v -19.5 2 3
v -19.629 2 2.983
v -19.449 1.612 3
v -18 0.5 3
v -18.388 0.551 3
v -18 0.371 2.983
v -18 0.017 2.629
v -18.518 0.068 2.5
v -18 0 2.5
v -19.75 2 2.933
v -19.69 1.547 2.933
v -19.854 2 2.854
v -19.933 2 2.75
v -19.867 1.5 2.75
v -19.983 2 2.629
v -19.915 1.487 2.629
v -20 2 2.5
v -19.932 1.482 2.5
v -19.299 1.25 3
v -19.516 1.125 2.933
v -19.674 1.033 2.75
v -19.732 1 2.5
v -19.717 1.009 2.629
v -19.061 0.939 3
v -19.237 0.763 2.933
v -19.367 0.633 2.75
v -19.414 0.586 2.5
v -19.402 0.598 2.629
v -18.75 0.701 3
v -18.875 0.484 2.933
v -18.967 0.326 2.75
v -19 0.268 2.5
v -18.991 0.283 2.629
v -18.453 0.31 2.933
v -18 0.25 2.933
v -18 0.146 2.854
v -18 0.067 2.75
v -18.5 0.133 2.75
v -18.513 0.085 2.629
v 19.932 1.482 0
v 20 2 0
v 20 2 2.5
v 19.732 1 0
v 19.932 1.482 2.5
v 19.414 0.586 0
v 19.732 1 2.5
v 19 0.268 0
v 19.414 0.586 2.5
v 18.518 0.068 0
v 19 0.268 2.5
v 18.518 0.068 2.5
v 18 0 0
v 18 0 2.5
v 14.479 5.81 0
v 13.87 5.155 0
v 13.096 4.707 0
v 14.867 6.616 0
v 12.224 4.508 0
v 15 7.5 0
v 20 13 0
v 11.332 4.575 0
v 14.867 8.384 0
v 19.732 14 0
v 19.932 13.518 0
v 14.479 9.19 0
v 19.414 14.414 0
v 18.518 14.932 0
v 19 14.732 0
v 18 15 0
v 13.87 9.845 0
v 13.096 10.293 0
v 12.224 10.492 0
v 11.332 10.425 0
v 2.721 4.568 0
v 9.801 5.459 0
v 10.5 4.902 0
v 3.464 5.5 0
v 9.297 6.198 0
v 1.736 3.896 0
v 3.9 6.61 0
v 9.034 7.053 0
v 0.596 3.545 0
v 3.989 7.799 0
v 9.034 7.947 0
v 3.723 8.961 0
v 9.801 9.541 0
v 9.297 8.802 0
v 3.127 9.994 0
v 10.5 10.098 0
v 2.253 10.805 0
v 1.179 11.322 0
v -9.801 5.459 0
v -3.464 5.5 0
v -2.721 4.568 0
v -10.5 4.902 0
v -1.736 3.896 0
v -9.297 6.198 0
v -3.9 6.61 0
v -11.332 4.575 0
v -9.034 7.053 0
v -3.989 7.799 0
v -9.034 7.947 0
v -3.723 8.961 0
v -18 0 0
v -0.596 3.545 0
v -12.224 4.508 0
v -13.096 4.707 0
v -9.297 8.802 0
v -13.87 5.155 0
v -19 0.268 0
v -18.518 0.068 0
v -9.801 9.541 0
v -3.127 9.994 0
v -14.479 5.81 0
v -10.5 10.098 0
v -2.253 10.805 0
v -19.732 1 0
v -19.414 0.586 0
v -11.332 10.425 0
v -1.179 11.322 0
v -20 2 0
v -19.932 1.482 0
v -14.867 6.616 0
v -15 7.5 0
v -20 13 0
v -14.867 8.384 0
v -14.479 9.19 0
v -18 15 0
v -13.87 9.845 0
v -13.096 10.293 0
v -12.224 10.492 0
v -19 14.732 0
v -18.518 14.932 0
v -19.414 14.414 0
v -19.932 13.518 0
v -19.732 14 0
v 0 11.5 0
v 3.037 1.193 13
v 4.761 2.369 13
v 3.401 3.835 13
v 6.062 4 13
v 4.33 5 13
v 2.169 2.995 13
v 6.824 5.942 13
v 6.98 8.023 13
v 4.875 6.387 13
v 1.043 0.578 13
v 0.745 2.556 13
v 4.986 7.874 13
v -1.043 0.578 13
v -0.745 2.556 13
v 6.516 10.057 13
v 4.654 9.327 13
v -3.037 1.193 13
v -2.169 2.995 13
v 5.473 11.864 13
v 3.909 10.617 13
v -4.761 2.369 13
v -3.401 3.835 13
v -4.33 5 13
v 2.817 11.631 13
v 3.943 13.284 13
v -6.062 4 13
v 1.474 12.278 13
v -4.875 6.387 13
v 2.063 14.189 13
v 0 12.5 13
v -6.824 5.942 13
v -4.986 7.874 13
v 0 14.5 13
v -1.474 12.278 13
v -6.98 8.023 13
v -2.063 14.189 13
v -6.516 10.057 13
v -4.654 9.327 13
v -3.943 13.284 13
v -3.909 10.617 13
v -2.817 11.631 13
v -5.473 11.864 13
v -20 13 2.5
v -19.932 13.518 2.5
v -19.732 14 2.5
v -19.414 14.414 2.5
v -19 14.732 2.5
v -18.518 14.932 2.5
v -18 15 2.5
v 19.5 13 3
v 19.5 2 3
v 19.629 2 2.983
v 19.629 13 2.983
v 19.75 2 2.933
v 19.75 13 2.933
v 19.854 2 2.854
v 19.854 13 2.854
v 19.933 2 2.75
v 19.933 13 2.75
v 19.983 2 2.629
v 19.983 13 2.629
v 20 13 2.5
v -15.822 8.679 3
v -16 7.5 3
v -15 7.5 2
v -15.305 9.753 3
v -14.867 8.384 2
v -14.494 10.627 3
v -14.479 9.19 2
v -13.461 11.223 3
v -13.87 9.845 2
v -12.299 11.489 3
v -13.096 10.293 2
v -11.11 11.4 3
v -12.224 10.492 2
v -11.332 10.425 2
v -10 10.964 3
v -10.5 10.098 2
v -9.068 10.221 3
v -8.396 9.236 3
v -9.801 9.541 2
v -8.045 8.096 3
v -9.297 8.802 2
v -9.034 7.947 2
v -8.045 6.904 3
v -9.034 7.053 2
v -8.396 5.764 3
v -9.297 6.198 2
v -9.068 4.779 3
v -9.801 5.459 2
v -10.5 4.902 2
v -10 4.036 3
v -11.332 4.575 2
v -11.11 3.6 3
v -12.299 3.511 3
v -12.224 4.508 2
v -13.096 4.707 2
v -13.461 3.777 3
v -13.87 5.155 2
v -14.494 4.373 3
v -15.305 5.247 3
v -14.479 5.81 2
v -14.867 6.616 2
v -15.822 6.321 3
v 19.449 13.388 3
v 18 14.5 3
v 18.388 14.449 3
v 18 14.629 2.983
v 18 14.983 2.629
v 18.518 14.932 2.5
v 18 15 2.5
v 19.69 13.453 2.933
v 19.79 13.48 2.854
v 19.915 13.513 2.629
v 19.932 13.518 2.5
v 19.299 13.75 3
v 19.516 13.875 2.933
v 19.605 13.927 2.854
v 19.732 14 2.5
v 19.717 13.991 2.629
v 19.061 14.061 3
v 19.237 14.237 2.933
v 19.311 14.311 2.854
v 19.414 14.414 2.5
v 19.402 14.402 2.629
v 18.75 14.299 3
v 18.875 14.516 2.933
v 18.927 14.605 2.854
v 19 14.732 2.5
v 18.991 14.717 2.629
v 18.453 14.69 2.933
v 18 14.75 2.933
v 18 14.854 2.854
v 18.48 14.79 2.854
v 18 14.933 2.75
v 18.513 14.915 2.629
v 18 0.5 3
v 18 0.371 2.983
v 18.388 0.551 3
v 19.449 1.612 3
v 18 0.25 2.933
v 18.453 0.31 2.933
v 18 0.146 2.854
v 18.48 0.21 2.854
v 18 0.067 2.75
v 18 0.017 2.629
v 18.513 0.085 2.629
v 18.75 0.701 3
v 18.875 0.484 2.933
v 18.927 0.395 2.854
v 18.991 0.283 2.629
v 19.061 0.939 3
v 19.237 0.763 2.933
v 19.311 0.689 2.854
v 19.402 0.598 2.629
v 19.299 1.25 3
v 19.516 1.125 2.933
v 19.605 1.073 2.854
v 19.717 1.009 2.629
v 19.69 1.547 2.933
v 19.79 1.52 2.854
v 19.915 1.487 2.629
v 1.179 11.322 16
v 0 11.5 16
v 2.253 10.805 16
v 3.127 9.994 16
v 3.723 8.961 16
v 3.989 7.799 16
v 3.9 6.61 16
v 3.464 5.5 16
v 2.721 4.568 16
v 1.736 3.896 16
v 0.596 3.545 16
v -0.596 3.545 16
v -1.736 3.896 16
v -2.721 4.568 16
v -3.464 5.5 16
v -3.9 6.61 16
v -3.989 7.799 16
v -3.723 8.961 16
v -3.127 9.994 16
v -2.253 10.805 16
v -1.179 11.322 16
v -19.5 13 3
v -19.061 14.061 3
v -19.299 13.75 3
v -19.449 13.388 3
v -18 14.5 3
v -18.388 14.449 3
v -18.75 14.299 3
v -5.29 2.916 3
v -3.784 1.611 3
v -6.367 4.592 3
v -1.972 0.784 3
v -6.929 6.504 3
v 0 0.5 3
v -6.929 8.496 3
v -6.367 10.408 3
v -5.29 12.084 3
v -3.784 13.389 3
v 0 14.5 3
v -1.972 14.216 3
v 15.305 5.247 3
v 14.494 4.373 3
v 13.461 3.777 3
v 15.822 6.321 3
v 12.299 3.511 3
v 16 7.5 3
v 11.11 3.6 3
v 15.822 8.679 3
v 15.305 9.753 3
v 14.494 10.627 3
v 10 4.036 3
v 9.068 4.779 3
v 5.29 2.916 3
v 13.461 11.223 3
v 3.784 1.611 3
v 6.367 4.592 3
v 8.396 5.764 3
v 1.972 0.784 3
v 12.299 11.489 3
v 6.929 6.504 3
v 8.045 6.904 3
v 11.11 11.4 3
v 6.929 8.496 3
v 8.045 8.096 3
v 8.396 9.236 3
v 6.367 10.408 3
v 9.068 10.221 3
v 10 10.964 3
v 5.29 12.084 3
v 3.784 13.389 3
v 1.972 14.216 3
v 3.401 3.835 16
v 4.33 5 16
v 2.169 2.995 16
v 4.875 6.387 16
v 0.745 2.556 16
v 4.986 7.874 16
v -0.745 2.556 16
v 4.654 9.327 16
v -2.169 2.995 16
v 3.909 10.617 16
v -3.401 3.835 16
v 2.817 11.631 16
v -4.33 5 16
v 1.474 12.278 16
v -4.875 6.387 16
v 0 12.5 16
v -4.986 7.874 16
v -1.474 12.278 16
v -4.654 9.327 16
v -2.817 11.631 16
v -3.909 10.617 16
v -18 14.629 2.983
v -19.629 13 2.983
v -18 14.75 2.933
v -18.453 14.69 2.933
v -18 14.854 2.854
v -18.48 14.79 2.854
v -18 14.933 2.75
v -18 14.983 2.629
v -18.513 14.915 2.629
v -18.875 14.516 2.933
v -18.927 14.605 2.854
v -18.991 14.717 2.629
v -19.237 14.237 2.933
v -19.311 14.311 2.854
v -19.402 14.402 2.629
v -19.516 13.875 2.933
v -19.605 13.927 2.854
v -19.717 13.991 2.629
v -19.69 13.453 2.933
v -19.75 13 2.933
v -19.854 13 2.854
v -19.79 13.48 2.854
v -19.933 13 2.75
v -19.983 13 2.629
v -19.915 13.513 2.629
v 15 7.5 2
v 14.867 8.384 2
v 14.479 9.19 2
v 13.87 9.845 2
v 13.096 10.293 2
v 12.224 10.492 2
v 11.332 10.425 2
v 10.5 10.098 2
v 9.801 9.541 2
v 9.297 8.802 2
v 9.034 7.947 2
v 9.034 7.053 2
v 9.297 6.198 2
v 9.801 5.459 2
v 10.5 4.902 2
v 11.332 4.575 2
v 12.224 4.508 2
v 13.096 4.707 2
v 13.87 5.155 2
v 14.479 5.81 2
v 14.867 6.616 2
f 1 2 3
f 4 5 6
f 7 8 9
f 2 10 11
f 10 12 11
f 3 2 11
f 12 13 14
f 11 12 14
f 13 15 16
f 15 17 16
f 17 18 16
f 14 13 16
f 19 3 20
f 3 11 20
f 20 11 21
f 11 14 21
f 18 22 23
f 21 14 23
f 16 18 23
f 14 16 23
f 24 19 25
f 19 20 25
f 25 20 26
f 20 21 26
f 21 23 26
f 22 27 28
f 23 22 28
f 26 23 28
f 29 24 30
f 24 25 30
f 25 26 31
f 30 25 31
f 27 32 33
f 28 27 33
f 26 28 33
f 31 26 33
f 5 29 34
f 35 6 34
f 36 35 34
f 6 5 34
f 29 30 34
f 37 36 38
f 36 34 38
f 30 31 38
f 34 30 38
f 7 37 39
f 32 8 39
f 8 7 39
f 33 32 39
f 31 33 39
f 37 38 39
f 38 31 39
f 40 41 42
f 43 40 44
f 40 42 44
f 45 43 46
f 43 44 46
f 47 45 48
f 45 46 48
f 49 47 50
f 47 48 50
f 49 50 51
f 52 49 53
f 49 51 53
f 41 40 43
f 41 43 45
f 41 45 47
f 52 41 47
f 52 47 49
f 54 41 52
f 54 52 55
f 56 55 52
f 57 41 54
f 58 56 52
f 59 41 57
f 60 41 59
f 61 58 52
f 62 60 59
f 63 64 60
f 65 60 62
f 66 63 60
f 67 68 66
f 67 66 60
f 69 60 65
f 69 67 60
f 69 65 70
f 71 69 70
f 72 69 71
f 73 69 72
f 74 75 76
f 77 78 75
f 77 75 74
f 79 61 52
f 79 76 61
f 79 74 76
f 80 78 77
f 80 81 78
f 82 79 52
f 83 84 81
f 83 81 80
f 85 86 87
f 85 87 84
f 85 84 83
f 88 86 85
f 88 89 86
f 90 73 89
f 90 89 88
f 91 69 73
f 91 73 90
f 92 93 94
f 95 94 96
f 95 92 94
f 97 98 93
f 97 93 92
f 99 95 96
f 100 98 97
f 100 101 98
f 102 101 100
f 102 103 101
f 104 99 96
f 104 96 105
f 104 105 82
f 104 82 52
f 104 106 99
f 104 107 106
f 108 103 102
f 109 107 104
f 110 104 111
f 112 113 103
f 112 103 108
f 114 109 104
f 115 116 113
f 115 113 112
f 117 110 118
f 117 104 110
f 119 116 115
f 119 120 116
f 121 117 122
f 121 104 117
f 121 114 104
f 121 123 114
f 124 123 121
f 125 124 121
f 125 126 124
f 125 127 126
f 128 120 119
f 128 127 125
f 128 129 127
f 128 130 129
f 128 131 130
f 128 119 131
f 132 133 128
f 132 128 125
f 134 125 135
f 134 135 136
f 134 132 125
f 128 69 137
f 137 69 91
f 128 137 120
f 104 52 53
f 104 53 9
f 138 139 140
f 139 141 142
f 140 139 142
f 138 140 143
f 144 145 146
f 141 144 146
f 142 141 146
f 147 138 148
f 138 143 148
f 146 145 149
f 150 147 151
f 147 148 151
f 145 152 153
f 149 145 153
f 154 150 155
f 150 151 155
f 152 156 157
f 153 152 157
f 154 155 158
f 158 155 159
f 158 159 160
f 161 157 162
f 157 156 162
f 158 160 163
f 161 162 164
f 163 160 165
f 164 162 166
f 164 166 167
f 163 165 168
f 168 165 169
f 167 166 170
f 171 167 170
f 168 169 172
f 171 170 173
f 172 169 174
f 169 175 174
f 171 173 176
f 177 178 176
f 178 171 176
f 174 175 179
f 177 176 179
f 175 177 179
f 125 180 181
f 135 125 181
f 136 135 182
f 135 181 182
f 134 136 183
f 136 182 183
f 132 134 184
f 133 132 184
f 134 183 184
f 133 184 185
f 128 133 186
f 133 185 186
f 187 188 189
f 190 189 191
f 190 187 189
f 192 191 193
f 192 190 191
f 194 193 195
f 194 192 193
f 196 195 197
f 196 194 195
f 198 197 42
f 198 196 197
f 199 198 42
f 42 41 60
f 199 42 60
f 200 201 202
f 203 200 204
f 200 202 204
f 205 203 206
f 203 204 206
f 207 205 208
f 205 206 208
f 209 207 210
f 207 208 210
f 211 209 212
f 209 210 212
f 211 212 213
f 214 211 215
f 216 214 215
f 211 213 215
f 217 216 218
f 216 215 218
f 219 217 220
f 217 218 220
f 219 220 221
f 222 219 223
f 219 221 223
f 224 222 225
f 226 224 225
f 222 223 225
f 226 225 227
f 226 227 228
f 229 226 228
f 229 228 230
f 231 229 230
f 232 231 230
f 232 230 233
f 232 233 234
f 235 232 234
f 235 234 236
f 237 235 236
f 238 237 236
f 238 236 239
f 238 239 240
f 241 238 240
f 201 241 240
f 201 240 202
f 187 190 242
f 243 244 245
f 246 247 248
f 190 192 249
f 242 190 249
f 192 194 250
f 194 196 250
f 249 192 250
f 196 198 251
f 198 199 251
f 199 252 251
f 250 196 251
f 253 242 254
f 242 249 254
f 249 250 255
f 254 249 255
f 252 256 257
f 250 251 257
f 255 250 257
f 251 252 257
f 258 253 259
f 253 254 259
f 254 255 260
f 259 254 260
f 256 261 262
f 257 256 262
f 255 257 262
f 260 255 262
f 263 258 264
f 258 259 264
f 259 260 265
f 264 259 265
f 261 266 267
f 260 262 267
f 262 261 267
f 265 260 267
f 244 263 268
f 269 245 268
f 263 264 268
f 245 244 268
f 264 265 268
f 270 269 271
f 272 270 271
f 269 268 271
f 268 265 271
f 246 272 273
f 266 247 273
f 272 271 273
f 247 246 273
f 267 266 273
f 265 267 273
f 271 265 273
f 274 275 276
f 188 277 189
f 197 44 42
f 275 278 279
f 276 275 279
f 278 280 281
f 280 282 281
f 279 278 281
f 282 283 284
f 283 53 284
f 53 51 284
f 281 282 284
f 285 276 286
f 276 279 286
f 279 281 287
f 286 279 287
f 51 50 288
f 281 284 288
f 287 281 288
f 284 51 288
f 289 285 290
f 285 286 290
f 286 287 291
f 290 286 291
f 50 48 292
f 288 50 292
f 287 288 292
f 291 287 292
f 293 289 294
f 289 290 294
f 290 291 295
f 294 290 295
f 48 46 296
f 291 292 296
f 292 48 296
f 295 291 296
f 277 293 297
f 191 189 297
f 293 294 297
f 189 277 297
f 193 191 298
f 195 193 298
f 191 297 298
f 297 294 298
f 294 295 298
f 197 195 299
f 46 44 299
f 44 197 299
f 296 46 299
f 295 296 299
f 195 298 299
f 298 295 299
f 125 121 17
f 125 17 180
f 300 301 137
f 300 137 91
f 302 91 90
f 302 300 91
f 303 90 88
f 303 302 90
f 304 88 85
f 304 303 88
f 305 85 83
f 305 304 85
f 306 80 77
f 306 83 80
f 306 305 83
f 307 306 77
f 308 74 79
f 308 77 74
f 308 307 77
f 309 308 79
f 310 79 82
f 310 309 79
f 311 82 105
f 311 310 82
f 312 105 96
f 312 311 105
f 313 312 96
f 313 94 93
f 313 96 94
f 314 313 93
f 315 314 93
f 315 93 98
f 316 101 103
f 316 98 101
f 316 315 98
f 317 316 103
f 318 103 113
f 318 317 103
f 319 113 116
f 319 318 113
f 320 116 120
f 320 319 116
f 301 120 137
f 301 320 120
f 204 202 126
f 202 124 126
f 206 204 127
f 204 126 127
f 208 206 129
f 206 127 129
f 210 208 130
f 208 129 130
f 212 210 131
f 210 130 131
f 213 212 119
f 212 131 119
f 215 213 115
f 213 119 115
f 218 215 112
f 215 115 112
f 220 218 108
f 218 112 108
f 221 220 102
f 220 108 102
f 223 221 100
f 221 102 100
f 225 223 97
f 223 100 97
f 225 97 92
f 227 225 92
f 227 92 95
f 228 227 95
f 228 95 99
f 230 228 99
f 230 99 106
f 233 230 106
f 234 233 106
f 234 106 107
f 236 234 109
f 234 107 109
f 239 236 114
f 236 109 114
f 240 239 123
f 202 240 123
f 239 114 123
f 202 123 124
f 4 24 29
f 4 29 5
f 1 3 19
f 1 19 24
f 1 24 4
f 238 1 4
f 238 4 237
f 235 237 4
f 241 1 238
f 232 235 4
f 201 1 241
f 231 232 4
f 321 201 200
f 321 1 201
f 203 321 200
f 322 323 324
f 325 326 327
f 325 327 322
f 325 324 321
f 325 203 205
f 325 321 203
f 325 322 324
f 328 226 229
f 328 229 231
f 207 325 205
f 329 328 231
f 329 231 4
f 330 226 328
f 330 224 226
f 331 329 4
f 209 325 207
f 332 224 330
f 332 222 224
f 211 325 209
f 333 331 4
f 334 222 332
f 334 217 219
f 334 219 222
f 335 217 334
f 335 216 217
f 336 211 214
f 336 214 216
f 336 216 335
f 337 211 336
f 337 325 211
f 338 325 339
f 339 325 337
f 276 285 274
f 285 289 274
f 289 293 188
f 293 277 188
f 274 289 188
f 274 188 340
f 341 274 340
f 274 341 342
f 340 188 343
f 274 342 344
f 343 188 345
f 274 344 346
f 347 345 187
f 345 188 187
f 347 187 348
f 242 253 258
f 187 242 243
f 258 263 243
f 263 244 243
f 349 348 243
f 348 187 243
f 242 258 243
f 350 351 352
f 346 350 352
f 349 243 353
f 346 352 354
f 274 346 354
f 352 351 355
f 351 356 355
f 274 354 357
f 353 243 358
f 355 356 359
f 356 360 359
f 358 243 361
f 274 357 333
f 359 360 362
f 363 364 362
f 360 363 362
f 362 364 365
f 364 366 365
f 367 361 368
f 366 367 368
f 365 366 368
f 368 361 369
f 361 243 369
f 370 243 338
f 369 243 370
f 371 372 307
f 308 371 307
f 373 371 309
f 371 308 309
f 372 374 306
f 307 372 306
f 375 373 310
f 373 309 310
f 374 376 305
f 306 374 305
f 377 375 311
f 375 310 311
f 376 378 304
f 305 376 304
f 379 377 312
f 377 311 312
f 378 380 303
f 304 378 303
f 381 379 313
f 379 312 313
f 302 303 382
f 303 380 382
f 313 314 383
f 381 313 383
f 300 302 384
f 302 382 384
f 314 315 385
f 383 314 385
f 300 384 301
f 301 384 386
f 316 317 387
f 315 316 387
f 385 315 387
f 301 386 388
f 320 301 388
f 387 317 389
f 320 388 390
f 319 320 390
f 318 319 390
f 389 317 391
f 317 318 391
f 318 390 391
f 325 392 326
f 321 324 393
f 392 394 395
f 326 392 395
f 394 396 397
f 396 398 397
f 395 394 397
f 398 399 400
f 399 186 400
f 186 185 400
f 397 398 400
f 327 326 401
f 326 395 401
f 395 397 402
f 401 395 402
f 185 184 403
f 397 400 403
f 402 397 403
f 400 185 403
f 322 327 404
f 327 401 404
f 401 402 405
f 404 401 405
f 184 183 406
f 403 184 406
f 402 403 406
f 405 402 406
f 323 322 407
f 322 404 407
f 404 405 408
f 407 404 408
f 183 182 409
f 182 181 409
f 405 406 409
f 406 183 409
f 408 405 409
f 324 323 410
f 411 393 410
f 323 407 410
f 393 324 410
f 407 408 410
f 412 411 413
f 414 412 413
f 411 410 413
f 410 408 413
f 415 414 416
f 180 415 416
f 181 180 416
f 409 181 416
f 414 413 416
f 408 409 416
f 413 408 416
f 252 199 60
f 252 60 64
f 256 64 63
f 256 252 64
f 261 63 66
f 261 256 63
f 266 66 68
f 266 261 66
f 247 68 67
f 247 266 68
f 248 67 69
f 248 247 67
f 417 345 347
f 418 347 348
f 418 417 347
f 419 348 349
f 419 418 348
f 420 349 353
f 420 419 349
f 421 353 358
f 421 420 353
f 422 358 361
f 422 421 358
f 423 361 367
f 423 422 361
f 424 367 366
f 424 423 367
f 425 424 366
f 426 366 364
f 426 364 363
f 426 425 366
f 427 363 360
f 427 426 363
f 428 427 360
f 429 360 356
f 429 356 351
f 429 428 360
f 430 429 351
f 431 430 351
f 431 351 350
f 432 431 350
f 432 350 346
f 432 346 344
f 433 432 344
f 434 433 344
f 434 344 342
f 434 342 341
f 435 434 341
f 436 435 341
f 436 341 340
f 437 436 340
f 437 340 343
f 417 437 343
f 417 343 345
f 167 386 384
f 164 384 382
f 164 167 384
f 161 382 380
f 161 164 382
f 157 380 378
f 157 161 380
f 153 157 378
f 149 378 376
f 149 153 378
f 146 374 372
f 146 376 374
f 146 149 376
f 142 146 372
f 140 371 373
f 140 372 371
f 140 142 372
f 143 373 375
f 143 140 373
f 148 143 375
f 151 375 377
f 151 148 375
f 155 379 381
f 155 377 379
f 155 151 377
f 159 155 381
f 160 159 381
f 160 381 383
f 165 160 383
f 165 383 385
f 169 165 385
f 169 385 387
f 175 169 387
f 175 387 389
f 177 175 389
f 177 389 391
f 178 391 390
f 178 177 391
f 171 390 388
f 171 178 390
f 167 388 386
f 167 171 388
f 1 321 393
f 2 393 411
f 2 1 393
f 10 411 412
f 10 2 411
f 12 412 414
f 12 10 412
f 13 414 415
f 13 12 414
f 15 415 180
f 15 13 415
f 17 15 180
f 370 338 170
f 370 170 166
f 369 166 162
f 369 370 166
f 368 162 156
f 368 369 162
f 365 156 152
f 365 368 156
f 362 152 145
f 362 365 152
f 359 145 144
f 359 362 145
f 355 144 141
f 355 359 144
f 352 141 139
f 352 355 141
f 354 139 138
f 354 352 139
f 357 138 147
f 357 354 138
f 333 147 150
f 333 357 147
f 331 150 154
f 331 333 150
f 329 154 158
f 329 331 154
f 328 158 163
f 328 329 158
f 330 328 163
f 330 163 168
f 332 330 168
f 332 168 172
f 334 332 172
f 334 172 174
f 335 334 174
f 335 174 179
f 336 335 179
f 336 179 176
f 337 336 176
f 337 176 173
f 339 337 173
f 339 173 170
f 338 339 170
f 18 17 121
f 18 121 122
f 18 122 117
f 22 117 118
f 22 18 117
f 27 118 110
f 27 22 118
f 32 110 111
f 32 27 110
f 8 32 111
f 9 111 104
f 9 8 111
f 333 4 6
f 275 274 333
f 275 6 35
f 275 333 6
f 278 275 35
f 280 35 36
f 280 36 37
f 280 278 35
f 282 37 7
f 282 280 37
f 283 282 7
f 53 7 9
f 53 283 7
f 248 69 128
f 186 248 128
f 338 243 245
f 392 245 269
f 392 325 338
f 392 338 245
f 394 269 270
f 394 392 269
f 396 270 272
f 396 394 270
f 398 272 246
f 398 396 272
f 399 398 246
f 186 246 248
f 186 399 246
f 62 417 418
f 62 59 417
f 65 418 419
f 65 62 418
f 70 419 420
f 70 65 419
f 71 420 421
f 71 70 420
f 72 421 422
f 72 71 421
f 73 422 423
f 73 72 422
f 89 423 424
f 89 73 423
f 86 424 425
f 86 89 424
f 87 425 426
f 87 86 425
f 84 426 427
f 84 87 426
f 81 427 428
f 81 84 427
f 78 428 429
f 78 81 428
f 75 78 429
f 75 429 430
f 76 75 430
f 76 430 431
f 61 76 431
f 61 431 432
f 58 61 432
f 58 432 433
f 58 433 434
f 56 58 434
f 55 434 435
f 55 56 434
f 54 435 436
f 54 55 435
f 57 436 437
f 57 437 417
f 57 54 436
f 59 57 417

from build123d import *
from build123d import SkipClean  # not in build123d's __all__

# Parameters (mm, degrees)
F0_W           = 20
F0_H           = 15
F1_DEPTH       = 3
F3_DEPTH       = 10
F5_DEPTH       = 3
F7_DEPTH       = 25
F9_D           = 6
F9_CSINK_D     = 8
F9_CSINK_ANGLE = 90
F10_R          = 2
F12_R          = 0.5


with BuildPart() as f1:
    # F0 (on Top) → F1 (new body)
    with BuildSketch(Plane.XY):
        with Locations((-10, 7.5)):
            Rectangle(F0_W, F0_H)
    extrude(amount=F1_DEPTH)

    # F2 (on face) → F3 (join)
    with BuildSketch(Plane.XY.offset(3)):
        with BuildLine():
            Line((0, 0.5), (0, 14.5))
            ThreePointArc((0, 14.5), (-7, 7.5), (0, 0.5))
        make_face()
    extrude(amount=F3_DEPTH)

    # F4 (on face) → F5 (join)
    with BuildSketch(Plane.XY.offset(13)):
        with BuildLine():
            Line((0, 2.5), (0, 12.5))
            ThreePointArc((0, 12.5), (-5, 7.5), (0, 2.5))
        make_face()
    extrude(amount=F5_DEPTH)

    # F6 (on face) → F7 (cut)
    with BuildSketch(Plane.XY.offset(16)):
        with BuildLine():
            Line((0, 3.5), (0, 11.5))
            ThreePointArc((0, 11.5), (-4, 7.5), (0, 3.5))
        make_face()
    extrude(amount=-F7_DEPTH, mode=Mode.SUBTRACT)

    # F9 (through all)
    with Locations(Plane.XY.offset(3)):
        with Locations((-12, 7.5)):
            CounterSinkHole(F9_D / 2, F9_CSINK_D / 2, counter_sink_angle=F9_CSINK_ANGLE)

    # F10
    f10_edges = [f1.edges().sort_by_distance(p)[0] for p in [
        (-20, 0, 1.5),
        (-20, 15, 1.5),
    ]]
    fillet(f10_edges, radius=F10_R)

    # F11: F1 across plane


with BuildPart() as f1_1:
    add(f1.part, clean=False)
    with SkipClean():  # cleaning this boolean's faces spoils the solid; the shape is the same uncleaned
        add(f1.part.mirror(Plane.YZ), clean=False)

    # F12
    f12_edges = [f1_1.edges().sort_by_distance(p)[0] for p in [
        (-9, 0, 3),
        (9, 0, 3),
    ]]
    fillet(f12_edges, radius=F12_R)


solid = f1_1.part
